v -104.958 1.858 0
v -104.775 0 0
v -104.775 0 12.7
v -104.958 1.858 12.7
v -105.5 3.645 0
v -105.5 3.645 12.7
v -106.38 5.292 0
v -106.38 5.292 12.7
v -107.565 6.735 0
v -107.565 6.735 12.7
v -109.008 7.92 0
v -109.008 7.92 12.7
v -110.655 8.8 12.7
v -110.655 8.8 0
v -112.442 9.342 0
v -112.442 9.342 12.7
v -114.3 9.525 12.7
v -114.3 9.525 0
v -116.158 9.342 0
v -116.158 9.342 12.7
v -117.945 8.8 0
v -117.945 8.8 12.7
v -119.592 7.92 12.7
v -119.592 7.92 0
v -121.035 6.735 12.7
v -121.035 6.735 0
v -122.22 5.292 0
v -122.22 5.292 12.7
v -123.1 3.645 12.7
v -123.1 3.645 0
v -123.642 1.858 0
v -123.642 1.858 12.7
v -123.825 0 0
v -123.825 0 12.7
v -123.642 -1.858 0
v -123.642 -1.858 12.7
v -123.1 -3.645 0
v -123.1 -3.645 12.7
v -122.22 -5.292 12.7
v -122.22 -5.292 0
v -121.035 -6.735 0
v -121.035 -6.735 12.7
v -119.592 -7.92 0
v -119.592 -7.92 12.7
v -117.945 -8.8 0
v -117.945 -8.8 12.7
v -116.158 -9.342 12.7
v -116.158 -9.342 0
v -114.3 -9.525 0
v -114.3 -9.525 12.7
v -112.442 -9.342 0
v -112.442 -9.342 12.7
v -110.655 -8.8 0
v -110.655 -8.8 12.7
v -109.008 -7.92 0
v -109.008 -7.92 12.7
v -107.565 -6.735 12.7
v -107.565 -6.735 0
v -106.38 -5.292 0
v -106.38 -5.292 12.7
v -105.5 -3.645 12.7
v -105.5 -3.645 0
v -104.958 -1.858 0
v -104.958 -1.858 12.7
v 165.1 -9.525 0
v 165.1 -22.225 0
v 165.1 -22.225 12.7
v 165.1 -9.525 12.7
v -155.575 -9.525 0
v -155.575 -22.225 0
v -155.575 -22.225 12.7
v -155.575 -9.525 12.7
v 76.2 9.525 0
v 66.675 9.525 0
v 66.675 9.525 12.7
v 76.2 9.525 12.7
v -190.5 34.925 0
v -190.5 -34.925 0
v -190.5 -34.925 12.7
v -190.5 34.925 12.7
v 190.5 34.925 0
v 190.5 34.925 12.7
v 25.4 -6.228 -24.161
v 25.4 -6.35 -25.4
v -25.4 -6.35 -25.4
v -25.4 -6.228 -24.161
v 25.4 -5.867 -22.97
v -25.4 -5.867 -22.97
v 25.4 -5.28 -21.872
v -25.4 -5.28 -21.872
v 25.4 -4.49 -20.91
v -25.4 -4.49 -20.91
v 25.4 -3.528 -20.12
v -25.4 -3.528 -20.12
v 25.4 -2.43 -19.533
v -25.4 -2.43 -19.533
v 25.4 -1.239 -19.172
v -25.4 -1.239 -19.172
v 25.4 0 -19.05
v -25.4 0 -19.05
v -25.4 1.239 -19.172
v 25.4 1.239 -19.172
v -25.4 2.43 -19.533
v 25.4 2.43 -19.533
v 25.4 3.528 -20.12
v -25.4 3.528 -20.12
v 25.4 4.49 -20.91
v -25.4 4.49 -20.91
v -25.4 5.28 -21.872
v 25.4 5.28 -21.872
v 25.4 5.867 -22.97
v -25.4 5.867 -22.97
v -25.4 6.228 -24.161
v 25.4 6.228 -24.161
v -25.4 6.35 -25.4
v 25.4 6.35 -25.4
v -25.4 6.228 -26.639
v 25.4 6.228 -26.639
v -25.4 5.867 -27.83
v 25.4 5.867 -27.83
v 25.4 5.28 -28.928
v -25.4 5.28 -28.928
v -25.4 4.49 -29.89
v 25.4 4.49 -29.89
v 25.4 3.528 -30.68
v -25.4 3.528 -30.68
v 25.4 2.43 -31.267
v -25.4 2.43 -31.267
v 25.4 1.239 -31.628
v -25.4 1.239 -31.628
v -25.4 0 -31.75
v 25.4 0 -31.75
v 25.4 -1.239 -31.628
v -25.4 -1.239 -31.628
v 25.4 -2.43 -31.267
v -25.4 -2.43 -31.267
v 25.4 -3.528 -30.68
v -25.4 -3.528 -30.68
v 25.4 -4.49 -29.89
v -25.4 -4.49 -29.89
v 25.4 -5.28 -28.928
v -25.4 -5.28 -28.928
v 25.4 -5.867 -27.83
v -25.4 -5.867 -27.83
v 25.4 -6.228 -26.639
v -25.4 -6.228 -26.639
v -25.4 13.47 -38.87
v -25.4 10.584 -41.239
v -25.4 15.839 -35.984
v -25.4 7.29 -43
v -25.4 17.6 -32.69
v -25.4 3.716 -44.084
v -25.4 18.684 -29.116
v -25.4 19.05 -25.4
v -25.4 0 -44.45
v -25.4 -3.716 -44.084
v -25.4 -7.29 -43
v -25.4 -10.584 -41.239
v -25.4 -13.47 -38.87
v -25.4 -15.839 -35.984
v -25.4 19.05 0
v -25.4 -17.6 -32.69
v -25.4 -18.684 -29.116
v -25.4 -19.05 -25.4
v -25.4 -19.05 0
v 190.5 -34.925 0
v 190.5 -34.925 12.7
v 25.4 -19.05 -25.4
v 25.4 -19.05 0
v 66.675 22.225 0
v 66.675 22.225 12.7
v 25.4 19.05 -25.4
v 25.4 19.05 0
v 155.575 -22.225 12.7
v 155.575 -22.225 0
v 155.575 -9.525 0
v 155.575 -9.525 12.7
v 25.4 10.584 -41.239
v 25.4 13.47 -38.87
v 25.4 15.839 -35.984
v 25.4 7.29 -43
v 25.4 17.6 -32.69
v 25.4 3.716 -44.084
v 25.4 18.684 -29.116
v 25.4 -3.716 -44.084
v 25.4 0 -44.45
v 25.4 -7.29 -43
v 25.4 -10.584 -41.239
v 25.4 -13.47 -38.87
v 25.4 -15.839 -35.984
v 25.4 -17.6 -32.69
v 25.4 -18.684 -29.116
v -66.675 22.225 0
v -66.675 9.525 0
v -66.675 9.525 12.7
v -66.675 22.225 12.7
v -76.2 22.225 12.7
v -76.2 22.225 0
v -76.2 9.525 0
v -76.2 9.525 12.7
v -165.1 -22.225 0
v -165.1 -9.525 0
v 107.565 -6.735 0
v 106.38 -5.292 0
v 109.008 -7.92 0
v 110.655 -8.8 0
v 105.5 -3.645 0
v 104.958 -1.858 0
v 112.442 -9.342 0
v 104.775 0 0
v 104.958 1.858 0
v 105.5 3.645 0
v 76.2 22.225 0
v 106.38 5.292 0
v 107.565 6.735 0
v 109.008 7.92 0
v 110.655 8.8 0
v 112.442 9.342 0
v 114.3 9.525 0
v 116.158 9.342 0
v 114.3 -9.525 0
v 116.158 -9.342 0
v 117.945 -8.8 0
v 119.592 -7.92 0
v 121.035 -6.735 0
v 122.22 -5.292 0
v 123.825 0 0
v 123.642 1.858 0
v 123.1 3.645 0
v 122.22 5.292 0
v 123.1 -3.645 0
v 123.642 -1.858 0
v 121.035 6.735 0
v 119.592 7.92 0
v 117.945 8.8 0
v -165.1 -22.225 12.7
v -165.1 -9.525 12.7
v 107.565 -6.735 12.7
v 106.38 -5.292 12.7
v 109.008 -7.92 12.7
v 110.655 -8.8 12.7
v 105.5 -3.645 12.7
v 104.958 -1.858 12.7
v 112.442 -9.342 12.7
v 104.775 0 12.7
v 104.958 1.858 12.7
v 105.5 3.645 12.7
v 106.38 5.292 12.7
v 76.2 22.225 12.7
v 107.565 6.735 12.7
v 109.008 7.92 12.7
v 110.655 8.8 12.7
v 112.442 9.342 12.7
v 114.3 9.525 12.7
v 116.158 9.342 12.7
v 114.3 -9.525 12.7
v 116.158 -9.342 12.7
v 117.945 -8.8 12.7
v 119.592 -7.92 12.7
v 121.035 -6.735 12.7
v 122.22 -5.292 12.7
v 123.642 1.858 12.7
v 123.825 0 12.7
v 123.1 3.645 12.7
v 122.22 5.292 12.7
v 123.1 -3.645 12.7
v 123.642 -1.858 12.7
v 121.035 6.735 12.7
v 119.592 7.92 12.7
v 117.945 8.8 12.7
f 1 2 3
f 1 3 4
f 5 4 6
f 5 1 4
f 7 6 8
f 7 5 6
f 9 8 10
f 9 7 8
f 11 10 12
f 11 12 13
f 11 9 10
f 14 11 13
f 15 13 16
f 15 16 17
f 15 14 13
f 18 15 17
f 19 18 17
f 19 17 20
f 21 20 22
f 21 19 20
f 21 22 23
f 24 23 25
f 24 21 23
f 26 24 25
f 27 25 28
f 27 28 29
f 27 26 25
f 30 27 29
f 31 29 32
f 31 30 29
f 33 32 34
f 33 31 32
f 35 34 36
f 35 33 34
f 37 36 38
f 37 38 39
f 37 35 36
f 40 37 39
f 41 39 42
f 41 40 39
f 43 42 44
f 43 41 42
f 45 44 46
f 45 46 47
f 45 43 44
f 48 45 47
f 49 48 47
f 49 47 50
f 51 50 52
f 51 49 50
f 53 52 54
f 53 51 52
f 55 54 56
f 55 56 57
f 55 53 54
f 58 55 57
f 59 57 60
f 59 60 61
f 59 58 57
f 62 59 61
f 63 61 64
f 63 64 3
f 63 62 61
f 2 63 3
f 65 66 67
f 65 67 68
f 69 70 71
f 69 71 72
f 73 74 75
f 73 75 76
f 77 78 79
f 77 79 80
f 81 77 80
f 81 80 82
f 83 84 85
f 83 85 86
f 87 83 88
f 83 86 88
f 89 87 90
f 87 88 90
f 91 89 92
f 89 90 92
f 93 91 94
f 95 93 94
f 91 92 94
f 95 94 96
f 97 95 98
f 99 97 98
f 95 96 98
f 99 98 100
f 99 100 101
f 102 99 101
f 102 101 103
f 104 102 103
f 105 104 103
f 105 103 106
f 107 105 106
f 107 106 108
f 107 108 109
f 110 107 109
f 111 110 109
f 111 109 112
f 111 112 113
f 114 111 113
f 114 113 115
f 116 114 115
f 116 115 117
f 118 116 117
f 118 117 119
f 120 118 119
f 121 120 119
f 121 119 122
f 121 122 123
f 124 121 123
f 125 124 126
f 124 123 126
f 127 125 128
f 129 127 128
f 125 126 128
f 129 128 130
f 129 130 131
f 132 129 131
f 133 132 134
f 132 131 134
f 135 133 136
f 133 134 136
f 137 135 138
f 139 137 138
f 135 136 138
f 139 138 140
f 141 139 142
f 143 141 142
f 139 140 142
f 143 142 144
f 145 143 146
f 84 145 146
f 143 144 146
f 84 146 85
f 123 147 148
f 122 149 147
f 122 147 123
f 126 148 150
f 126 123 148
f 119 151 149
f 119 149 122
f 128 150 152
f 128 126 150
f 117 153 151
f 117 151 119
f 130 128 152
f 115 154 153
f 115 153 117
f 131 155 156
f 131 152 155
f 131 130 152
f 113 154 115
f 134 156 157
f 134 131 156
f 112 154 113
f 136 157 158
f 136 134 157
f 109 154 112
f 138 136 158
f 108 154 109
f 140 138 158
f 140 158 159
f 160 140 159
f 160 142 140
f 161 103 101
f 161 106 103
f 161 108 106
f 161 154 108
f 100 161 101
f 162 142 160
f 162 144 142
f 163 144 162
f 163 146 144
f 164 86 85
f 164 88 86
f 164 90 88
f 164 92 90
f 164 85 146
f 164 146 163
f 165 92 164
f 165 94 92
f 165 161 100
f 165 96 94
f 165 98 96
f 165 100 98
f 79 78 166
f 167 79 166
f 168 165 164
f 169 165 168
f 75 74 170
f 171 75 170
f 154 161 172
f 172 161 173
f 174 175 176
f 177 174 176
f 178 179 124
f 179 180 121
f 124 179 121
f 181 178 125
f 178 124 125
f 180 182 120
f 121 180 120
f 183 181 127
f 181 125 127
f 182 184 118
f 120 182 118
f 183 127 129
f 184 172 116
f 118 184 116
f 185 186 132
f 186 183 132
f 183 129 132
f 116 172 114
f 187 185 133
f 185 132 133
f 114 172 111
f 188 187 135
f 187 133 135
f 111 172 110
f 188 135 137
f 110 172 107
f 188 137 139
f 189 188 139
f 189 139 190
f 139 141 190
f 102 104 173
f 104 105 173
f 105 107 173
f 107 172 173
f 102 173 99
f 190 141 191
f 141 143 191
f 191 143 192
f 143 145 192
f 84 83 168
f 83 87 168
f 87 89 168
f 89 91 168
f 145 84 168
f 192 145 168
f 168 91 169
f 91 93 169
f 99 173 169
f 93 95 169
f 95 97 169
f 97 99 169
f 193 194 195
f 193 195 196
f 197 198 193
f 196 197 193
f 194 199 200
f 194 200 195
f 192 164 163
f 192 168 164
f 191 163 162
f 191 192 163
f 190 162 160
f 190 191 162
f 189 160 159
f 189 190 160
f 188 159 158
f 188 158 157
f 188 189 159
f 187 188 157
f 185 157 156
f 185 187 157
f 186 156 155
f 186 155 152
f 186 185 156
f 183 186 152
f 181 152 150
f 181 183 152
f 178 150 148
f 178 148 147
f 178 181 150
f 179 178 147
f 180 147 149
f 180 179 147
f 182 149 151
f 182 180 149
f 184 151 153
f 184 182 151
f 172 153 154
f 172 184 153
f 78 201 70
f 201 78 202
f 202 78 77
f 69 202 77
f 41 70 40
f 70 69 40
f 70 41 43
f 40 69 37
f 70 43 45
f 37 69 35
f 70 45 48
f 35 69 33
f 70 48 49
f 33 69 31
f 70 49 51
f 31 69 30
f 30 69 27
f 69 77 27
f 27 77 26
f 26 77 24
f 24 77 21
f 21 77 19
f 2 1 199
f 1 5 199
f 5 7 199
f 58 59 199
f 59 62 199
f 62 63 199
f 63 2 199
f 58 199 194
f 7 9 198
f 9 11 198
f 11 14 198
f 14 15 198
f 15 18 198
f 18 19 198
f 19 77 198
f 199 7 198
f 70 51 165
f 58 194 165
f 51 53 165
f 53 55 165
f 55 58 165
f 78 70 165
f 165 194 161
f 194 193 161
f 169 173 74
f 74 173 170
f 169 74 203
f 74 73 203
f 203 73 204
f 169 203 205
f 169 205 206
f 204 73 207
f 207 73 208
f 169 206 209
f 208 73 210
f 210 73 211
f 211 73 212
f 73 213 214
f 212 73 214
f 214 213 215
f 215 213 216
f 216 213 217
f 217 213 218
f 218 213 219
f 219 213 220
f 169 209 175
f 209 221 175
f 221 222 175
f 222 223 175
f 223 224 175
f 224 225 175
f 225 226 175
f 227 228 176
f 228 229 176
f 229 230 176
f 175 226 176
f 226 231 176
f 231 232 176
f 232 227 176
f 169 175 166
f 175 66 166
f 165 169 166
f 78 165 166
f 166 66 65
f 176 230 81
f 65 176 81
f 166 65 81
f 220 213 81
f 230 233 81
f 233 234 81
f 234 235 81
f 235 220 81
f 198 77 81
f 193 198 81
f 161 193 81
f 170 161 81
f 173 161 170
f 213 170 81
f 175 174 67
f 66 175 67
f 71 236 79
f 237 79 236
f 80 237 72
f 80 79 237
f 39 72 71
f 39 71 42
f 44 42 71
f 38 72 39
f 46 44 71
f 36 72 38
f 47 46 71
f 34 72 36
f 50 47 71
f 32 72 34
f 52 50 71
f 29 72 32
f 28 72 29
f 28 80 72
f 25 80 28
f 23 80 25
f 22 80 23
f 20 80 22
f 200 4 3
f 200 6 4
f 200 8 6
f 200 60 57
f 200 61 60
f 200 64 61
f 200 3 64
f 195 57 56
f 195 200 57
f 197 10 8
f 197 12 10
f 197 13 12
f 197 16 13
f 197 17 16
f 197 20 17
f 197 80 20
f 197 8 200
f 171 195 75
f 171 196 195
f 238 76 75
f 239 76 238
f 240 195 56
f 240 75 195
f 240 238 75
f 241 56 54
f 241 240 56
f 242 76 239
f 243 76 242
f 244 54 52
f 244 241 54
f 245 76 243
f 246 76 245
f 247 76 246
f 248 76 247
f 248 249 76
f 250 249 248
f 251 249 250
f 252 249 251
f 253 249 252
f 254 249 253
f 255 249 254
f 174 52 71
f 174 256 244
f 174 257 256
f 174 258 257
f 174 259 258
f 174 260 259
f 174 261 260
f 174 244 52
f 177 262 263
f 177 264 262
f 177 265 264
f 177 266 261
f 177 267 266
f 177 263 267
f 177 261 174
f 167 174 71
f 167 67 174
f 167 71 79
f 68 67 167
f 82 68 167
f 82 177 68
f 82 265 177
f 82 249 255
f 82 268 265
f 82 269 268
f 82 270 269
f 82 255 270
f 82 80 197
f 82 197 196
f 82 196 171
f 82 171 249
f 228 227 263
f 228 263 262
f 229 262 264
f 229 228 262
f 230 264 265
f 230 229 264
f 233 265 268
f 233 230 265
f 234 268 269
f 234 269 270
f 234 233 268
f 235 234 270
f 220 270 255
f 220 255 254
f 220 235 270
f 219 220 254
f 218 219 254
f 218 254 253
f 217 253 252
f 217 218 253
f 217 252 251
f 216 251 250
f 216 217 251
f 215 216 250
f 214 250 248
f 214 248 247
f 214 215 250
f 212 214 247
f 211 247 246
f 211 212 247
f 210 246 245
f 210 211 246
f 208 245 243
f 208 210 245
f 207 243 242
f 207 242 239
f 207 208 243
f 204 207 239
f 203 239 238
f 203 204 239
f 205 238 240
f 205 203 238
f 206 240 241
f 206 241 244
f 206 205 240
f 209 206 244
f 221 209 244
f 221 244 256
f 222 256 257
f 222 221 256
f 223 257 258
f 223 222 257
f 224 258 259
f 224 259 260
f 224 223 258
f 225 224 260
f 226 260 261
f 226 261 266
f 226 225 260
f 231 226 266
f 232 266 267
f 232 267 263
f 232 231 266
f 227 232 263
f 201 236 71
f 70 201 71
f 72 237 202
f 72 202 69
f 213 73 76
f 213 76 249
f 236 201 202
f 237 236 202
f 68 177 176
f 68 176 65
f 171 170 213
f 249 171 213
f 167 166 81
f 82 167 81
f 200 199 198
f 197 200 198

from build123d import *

# Parameters (mm, degrees)
F0_W     = 381
F0_H     = 69.85
F0_W_2   = 9.525
F0_H_2   = 12.7
F0_R     = 9.525
F1_DEPTH = 12.7
F2_W     = 50.8
F2_H     = 38.1
F3_DEPTH = 25.4
F4_W     = 50.8
F4_H     = 19.05
F6_R     = 6.35
F7_DEPTH = 76.2


with BuildPart() as f1:
    # F0 (on Top) → F1 (new body)
    with BuildSketch(Plane.XY):
        Rectangle(F0_W, F0_H)
        with Locations((-160.3375, -15.875)):
            Rectangle(F0_W_2, F0_H_2, mode=Mode.SUBTRACT)
        with Locations((160.3375, -15.875)):
            Rectangle(F0_W_2, F0_H_2, mode=Mode.SUBTRACT)
        with Locations((-114.3, 0)):
            Circle(F0_R, mode=Mode.SUBTRACT)
        with Locations((-71.4375, 15.875)):
            Rectangle(F0_W_2, F0_H_2, mode=Mode.SUBTRACT)
        with Locations((71.4375, 15.875)):
            Rectangle(F0_W_2, F0_H_2, mode=Mode.SUBTRACT)
        with Locations((114.3, 0)):
            Circle(F0_R, mode=Mode.SUBTRACT)
    extrude(amount=F1_DEPTH)

    # F2 (on face) → F3 (join)
    with BuildSketch(Plane(origin=(0, 0, 0), x_dir=(1, 0, 0), z_dir=(0, 0, -1))):
        Rectangle(F2_W, F2_H)
    extrude(amount=F3_DEPTH)

    # F4 (on face) → F5 (revolve)
    with BuildSketch(Plane(origin=(0, 0, -25.4), x_dir=(1, 0, 0), z_dir=(0, 0, -1))):
        with Locations((0, -9.525)):
            Rectangle(F4_W, F4_H)
    revolve(axis=Axis((0, 0, -25.4), (1, 0, 0)))

    # F6 (on face) → F7 (cut)
    with BuildSketch(Plane(origin=(-25.4, 0, 0), x_dir=(0, -1, 0), z_dir=(-1, 0, 0))):
        with Locations((0, -25.4)):
            Circle(F6_R)
    extrude(amount=-F7_DEPTH, mode=Mode.SUBTRACT)


solid = f1.part
